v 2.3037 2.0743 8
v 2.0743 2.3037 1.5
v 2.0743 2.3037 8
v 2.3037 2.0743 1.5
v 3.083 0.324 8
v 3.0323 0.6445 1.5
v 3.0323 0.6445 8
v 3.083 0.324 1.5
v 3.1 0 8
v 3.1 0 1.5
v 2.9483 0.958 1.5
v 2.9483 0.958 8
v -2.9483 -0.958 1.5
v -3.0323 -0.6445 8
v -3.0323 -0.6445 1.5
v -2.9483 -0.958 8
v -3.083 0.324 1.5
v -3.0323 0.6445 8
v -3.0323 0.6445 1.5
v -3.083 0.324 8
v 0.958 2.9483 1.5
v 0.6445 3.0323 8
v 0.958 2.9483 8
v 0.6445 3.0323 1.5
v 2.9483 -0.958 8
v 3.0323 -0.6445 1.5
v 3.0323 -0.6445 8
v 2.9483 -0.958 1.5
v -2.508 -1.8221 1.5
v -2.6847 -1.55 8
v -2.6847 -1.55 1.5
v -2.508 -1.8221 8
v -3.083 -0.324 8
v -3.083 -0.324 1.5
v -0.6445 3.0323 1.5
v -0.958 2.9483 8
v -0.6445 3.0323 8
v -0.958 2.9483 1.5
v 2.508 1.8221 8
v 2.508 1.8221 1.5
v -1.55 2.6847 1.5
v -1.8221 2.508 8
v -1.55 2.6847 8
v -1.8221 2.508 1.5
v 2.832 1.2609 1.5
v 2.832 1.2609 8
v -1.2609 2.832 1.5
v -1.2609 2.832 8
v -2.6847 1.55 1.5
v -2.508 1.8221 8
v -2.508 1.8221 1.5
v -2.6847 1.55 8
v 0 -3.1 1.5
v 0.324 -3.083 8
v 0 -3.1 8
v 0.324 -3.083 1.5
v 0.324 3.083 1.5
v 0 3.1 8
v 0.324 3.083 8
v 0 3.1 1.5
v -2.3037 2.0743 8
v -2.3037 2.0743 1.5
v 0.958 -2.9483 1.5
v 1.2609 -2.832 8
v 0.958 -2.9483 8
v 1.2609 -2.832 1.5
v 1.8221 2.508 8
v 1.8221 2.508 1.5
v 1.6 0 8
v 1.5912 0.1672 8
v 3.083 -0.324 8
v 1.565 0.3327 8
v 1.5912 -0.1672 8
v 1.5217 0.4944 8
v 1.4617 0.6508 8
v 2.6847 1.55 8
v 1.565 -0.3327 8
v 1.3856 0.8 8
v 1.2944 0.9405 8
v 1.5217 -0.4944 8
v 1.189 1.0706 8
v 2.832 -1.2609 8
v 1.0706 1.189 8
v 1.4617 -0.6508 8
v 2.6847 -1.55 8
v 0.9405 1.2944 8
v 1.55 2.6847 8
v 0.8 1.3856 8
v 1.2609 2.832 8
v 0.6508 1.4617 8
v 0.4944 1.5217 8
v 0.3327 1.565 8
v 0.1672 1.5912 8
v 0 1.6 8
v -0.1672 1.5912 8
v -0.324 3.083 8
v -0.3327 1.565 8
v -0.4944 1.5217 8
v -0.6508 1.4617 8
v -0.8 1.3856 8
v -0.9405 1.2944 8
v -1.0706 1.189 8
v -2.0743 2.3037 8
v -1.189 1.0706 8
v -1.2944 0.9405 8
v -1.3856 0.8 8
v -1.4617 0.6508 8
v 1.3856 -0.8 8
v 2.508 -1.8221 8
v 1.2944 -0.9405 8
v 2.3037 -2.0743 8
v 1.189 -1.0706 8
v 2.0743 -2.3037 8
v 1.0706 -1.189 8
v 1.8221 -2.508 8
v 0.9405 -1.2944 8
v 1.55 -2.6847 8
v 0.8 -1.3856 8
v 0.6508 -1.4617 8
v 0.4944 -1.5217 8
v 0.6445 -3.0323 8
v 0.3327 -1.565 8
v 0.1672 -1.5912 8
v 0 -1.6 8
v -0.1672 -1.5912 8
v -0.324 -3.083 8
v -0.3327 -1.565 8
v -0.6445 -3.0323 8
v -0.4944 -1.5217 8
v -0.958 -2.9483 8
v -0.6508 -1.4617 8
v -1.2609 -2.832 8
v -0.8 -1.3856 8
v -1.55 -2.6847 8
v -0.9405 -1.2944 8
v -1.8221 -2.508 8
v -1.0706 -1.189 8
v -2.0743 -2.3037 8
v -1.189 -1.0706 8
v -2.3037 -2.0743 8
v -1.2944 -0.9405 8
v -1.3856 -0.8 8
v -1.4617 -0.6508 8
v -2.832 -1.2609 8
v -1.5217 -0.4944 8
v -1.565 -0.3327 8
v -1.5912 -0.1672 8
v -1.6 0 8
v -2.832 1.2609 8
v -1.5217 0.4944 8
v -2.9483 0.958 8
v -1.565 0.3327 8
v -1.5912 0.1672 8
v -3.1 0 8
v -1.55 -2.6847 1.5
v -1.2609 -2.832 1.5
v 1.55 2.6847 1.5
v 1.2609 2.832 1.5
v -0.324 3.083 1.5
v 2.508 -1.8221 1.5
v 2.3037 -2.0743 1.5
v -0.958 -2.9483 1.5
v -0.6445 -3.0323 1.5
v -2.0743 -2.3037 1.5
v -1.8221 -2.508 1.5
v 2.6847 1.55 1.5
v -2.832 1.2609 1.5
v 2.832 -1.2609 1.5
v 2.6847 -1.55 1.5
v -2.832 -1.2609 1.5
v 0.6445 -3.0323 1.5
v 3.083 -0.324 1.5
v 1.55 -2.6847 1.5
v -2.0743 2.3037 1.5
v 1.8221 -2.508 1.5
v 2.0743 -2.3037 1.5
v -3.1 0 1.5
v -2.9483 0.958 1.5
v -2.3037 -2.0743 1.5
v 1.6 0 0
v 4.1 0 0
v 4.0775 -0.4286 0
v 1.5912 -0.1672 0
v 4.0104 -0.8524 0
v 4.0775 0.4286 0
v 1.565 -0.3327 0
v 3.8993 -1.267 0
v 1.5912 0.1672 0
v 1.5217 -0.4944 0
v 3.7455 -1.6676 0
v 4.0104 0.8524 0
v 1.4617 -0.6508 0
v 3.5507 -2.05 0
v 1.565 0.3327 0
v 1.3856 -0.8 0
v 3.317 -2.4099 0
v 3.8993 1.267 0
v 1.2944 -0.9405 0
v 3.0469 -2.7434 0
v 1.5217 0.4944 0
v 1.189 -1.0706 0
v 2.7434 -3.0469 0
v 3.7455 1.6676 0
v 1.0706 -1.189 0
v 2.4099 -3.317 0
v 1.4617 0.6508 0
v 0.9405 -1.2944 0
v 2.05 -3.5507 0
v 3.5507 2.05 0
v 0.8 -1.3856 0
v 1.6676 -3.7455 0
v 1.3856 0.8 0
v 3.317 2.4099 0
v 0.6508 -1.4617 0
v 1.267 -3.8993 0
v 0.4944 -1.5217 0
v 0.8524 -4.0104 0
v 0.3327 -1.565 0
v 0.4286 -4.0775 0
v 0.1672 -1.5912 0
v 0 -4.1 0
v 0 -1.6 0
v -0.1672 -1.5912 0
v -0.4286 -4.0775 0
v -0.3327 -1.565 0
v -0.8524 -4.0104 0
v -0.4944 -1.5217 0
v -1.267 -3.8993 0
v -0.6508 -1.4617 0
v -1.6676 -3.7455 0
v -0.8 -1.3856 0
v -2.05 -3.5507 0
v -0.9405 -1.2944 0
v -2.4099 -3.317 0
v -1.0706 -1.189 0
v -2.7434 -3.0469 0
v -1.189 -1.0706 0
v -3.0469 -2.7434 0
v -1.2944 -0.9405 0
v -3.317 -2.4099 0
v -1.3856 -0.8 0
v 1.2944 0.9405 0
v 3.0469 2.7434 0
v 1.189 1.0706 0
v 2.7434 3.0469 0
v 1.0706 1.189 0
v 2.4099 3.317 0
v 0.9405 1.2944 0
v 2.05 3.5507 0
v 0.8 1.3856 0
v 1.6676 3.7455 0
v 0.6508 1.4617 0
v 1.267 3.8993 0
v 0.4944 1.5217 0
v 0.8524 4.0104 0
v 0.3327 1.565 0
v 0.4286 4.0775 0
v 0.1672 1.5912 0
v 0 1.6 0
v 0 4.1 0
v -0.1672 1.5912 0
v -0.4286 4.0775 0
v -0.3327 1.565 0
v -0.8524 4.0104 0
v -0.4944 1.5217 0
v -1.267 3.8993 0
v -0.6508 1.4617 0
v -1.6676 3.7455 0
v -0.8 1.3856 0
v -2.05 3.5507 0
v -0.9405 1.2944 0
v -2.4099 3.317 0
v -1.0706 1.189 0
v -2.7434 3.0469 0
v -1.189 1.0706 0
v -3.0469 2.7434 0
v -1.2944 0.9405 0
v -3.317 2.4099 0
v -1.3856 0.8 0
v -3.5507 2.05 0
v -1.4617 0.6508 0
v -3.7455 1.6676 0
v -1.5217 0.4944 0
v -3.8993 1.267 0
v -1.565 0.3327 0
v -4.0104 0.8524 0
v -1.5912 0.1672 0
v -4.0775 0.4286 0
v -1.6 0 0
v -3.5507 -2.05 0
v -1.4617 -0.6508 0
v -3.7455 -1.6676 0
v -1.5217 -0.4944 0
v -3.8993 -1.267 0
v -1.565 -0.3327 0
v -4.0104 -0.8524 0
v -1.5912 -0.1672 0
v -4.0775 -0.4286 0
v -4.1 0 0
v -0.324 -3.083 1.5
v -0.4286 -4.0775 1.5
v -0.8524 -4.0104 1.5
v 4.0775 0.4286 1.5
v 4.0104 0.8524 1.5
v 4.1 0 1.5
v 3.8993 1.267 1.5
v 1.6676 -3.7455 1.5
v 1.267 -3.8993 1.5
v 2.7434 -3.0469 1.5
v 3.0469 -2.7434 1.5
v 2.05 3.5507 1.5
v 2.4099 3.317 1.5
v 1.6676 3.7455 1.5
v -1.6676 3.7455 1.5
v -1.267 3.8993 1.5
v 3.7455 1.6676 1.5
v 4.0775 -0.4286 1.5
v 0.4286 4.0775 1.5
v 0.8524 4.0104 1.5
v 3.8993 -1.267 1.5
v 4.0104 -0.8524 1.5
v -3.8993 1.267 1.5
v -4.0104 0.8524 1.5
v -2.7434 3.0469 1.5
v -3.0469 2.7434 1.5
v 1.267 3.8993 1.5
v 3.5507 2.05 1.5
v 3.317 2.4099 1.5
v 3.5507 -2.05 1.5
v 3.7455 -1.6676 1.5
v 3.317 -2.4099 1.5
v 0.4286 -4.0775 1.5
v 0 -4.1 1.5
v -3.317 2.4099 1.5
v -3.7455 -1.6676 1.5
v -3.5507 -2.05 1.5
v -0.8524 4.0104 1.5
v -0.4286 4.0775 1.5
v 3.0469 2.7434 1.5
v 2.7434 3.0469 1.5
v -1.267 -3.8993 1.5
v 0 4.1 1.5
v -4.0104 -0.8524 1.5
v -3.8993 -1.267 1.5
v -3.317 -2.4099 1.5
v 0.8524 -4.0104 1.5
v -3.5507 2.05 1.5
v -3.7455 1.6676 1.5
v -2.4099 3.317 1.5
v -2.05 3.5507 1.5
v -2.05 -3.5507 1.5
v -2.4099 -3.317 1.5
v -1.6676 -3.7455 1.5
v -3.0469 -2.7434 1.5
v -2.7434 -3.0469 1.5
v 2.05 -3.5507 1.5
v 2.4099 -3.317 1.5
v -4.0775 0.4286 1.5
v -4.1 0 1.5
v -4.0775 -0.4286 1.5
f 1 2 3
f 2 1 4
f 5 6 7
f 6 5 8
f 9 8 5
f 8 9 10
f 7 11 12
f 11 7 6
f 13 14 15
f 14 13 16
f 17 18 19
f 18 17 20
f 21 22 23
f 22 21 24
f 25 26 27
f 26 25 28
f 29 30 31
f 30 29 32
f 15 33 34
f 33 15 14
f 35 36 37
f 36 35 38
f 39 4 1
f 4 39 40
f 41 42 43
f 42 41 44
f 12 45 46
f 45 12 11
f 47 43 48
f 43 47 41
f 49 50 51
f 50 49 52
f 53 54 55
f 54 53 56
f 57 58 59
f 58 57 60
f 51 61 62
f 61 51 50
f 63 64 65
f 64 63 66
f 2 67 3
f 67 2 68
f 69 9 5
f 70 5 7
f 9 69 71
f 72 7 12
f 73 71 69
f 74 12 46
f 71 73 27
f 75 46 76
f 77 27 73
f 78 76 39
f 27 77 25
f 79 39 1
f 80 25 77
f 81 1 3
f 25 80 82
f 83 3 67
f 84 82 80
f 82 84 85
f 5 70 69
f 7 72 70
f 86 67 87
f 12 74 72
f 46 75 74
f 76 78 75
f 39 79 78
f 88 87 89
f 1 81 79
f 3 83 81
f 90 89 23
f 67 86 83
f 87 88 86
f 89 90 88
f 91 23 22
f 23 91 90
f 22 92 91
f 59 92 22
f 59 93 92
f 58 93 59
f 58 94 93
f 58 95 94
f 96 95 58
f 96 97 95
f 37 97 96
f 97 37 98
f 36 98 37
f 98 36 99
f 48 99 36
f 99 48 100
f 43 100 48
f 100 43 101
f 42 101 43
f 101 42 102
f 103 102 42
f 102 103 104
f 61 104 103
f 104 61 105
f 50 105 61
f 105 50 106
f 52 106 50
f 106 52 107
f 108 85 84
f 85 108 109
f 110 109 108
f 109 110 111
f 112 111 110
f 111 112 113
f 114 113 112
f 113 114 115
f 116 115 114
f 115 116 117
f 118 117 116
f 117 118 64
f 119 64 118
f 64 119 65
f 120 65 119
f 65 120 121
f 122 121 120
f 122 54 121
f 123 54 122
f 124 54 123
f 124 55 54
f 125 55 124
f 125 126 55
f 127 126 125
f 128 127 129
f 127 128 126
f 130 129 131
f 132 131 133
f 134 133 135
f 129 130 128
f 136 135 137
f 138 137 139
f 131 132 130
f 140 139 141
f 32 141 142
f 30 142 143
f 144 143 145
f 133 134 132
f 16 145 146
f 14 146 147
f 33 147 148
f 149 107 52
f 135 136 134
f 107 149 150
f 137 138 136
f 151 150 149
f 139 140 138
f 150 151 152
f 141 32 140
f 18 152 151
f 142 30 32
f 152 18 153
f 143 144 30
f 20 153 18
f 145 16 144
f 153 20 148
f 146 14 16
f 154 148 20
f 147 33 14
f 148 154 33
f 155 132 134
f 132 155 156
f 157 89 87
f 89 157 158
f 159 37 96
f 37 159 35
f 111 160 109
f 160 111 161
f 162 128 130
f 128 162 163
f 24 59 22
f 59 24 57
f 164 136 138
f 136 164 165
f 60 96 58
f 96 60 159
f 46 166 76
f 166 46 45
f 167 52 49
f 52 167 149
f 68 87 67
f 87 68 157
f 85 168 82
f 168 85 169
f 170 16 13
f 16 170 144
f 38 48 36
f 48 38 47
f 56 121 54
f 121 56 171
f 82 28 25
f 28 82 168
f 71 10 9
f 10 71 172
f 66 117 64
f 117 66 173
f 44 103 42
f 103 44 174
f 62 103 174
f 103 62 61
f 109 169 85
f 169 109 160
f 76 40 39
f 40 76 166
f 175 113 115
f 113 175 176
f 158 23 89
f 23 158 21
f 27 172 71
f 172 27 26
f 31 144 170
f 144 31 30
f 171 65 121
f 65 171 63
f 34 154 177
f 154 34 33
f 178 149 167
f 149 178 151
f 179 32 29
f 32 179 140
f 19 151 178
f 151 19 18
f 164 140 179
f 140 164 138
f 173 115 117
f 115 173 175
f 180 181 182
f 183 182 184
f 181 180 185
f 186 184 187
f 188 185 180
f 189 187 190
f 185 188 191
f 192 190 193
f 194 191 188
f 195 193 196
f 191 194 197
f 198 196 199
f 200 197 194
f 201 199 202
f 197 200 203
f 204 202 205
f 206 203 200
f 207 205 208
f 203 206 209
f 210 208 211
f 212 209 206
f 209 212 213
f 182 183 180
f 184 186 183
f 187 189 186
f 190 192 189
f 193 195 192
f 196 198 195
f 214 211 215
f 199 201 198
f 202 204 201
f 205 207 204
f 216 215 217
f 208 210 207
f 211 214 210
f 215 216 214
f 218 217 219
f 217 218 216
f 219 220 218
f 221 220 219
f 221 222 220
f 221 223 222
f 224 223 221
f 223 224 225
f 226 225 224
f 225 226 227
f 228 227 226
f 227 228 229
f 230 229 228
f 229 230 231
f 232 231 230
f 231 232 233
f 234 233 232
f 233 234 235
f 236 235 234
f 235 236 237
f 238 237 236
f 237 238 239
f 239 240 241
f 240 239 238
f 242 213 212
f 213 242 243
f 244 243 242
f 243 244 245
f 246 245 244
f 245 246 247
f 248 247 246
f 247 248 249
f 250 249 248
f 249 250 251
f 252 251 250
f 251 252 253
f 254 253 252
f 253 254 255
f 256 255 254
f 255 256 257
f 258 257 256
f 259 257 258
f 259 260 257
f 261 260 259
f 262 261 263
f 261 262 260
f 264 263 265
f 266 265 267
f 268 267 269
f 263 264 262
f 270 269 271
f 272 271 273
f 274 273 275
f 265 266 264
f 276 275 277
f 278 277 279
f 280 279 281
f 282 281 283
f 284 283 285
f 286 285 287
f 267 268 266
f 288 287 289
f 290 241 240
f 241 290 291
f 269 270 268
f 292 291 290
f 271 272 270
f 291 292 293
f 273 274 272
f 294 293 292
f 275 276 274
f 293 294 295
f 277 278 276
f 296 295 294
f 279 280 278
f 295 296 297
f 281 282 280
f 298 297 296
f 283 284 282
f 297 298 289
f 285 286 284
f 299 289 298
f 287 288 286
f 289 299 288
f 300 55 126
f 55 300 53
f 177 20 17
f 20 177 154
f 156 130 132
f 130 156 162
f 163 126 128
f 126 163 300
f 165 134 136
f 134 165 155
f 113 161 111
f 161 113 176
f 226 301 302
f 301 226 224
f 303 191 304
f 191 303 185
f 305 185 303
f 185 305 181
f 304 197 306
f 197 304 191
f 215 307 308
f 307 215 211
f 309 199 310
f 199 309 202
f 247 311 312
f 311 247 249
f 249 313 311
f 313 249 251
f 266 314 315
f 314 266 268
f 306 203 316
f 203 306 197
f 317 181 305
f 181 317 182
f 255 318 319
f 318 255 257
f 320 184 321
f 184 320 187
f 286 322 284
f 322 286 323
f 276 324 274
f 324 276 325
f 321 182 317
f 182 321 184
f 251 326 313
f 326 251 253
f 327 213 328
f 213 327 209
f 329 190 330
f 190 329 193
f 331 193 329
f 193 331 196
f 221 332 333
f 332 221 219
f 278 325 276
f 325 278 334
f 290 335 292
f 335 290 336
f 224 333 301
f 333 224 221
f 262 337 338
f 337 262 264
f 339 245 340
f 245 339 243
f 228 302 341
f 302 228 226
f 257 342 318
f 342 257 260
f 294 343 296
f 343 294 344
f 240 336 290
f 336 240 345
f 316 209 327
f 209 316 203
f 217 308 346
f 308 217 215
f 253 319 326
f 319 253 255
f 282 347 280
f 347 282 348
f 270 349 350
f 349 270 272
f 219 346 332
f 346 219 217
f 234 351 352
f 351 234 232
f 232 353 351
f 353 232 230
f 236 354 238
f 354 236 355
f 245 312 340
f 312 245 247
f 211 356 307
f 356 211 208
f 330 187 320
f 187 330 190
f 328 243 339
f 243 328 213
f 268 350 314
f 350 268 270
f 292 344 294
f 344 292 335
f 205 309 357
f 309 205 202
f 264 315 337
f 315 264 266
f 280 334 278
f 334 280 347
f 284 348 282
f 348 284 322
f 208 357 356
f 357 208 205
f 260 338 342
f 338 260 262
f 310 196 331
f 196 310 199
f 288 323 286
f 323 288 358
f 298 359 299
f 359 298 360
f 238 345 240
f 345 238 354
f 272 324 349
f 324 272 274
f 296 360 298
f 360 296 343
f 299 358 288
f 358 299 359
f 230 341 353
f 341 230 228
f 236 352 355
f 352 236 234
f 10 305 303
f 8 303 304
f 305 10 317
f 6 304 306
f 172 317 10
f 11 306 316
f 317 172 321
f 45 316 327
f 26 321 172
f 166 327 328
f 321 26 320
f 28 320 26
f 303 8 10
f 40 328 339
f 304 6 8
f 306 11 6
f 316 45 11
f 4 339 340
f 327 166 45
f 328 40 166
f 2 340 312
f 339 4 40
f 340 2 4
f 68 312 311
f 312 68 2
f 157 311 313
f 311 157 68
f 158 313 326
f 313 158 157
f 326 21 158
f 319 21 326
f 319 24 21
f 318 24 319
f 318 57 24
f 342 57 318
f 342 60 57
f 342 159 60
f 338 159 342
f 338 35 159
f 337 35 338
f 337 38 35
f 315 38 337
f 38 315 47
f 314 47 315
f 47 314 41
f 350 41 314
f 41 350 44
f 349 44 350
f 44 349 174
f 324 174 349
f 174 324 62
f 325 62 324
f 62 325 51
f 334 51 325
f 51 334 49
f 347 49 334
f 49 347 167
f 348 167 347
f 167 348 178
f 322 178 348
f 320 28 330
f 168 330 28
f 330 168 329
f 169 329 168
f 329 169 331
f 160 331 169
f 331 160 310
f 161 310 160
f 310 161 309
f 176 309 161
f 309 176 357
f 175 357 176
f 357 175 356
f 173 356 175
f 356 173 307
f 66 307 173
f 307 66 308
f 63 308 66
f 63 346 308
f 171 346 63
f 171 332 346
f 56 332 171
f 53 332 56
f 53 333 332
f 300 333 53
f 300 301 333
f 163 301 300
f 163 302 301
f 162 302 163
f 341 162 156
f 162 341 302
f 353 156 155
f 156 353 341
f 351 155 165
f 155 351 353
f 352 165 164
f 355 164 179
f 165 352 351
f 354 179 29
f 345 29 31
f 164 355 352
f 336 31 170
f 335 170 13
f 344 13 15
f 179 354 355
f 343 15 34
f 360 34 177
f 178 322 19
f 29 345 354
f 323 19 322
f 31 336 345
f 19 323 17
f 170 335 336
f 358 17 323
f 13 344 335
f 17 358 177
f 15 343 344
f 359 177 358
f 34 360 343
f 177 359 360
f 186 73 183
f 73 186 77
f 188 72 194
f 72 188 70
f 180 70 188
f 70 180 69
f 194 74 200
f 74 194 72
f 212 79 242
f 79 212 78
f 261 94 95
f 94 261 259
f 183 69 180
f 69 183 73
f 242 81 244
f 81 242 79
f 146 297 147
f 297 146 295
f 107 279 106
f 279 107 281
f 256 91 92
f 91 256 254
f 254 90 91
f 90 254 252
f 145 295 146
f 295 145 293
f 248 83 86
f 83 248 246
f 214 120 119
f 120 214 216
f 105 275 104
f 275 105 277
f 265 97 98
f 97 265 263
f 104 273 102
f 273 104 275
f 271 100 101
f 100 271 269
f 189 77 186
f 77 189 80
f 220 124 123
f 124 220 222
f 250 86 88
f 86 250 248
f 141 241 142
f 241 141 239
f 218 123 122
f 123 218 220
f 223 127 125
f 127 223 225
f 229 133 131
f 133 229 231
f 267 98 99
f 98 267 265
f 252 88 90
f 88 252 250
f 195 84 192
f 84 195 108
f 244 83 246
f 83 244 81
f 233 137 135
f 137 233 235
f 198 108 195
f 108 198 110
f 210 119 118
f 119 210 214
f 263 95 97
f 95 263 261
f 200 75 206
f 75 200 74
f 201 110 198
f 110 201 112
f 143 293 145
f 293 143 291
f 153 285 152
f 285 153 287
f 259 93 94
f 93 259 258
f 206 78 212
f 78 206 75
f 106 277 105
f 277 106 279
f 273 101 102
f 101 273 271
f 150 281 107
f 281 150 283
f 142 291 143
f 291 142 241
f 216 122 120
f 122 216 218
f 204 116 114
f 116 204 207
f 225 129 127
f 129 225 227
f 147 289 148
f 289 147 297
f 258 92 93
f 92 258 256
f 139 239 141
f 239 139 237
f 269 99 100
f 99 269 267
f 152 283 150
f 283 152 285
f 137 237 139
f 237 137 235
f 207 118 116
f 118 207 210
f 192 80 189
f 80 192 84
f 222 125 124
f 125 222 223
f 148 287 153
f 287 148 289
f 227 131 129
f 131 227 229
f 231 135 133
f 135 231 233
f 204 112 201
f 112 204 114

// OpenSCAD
// Blind-rivet body.
$fn = 60;
eps = 0.02;
shank_d = 3.2;
head_d = 6;
length = 8;
difference() { union() { cylinder(d=shank_d+3,h=length); cylinder(d=max(head_d, shank_d+5),h=1.5); } translate([0,0,-eps]) cylinder(d=shank_d,h=length+2*eps); }
